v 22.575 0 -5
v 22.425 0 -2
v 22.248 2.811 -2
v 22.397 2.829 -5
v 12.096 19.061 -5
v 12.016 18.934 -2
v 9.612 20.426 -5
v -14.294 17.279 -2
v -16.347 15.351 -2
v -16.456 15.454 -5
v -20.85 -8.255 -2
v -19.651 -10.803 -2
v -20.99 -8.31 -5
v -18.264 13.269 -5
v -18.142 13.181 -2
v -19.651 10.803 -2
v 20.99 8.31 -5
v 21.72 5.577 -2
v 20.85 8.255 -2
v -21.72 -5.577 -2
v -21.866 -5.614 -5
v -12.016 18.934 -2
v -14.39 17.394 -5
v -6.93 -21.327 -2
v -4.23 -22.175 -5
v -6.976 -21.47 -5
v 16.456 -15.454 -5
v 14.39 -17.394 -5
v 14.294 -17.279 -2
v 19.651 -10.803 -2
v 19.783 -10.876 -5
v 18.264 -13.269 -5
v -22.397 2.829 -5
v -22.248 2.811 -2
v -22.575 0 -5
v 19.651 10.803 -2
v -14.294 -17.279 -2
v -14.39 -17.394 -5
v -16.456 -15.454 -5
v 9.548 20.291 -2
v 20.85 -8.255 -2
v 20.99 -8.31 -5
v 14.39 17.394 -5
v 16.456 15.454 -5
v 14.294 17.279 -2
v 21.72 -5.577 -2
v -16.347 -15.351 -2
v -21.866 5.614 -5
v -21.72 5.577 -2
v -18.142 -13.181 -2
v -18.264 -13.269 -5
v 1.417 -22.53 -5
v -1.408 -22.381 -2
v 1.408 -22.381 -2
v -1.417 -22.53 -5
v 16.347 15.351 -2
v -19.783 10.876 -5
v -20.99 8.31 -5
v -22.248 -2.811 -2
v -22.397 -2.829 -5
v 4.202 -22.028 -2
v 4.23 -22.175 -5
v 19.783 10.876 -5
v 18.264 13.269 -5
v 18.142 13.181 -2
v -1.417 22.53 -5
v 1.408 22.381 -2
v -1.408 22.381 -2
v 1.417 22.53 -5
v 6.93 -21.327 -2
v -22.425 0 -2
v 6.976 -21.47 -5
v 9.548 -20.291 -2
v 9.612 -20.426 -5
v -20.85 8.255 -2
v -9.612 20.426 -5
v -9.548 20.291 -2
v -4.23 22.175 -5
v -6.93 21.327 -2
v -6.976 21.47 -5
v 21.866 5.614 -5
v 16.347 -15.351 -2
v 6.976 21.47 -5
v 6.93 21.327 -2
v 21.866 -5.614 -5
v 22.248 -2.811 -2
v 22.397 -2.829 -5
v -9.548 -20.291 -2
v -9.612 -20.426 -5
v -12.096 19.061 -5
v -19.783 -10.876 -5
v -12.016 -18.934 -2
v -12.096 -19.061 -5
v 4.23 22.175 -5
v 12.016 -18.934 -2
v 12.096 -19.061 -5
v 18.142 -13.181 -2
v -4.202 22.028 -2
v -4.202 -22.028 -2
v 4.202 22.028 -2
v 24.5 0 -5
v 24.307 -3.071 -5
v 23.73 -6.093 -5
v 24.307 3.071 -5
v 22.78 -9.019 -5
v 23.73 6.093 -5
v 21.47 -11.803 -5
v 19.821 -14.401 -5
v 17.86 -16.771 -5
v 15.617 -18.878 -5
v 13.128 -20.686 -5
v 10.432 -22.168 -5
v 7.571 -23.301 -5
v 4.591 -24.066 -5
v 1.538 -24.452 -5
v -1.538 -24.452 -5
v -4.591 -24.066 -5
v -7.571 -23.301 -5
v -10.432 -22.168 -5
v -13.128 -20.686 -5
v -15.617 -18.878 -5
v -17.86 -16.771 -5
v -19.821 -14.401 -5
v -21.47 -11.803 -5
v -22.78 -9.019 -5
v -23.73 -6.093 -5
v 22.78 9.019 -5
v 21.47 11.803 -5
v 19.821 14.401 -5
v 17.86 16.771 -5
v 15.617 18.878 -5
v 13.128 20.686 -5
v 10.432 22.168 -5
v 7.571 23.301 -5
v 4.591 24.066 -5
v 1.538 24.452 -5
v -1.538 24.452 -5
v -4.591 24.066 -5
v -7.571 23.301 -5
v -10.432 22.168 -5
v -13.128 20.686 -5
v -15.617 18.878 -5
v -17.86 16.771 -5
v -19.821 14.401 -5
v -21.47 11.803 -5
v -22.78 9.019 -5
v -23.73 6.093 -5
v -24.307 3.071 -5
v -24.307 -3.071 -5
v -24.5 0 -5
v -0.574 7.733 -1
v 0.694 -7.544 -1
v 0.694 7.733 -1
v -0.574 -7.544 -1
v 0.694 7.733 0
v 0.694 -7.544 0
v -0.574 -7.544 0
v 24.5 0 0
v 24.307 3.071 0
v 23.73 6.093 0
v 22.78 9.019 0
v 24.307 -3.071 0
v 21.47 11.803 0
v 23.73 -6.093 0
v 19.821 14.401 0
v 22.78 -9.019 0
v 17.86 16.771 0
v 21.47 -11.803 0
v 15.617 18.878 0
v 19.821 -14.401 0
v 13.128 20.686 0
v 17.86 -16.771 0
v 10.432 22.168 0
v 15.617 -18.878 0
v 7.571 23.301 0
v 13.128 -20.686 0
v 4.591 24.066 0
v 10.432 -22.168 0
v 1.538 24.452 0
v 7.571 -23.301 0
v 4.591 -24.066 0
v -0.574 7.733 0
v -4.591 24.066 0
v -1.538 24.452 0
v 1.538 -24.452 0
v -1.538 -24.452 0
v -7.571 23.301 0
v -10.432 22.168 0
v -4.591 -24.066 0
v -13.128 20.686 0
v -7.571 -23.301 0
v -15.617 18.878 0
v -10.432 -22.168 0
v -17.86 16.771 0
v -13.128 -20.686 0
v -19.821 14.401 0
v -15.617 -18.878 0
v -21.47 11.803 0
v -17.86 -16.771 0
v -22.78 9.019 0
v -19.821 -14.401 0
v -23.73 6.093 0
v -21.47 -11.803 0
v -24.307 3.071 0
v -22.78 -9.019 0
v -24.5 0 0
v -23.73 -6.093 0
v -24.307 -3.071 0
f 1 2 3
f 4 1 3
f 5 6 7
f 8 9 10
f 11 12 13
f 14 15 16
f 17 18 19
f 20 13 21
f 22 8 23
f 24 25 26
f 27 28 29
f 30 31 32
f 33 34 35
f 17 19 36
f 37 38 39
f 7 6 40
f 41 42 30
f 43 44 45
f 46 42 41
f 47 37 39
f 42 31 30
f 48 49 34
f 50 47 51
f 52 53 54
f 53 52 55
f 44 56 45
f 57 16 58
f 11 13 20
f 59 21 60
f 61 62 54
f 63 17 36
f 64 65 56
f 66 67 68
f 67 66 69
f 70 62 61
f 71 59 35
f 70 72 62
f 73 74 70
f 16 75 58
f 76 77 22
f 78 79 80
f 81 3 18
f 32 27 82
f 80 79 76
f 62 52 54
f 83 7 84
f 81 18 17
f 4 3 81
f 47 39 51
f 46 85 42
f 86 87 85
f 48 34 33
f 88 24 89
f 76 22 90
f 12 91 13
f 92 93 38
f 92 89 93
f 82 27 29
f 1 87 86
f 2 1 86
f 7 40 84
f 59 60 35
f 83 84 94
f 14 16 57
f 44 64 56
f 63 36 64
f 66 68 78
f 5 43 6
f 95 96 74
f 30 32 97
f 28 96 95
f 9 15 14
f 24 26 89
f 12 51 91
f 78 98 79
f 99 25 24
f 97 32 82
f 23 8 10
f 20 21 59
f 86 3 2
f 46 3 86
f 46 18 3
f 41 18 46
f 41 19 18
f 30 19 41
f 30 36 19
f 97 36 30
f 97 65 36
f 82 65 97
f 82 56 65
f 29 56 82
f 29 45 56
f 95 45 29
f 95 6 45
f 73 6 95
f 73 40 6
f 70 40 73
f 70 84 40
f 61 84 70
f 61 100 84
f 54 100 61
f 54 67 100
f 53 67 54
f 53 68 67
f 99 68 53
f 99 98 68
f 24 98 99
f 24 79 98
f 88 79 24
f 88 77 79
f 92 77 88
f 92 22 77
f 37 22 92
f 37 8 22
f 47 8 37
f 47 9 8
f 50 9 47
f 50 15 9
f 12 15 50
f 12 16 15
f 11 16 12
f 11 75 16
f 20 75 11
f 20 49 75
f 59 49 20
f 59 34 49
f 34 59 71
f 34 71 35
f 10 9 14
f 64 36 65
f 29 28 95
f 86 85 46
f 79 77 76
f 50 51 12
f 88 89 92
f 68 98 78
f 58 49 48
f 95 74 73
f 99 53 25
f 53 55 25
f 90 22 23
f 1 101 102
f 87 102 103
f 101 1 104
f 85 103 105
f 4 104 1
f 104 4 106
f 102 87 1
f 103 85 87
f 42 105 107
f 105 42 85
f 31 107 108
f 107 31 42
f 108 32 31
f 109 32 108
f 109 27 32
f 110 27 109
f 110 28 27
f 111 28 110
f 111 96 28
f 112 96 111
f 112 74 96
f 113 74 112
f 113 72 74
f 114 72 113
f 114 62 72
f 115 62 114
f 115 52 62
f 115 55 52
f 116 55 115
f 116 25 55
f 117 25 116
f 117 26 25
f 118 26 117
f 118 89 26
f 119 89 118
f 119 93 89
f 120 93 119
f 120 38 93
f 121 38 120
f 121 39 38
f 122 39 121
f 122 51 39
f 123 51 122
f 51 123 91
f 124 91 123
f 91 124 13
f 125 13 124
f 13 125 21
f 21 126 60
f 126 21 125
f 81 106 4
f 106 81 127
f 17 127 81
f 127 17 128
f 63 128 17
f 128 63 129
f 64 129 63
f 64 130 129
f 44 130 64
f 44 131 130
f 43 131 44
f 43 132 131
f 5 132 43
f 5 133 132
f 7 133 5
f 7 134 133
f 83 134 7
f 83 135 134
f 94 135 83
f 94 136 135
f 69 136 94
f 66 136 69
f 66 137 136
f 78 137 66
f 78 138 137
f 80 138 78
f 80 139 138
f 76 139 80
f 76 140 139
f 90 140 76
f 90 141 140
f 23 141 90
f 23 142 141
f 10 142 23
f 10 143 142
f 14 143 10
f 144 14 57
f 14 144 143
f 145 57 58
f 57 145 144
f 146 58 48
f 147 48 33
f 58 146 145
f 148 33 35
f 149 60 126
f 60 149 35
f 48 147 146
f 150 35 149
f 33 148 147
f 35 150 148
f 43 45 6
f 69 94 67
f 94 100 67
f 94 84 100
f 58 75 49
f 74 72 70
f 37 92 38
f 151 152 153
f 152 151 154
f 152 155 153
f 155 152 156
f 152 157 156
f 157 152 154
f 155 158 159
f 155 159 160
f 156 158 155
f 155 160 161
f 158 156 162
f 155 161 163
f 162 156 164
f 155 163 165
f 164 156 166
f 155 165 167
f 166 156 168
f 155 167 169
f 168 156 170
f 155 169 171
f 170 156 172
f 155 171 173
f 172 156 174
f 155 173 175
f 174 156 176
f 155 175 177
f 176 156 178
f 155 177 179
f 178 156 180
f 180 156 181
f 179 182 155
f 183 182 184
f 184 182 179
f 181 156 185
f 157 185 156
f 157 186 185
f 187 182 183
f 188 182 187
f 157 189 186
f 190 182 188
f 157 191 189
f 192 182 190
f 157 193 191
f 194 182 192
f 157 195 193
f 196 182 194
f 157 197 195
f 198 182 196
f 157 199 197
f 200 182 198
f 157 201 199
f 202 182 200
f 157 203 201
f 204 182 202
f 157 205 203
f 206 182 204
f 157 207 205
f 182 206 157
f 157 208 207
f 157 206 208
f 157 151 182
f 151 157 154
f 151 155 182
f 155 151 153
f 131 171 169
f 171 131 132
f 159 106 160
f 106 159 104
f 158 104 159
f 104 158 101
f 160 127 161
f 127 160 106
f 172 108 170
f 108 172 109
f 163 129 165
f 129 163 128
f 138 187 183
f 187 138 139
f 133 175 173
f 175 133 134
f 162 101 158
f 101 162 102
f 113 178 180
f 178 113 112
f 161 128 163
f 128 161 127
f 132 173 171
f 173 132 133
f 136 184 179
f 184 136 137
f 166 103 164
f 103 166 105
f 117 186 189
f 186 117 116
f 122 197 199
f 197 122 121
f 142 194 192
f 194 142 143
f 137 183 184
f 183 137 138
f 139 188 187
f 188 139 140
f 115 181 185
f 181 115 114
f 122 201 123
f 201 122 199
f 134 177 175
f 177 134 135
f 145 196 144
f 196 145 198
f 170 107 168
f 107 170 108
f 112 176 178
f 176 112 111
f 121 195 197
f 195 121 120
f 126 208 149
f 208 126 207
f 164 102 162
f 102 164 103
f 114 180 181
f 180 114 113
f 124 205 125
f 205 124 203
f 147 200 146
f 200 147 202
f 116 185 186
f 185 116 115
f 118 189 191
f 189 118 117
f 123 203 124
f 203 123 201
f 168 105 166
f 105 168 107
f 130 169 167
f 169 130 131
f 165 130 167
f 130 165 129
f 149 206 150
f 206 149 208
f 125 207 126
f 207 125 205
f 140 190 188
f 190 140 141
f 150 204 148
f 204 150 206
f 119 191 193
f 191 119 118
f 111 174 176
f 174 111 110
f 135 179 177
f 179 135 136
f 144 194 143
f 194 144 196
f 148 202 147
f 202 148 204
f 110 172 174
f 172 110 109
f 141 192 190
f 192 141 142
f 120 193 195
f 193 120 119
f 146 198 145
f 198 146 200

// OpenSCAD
$fn = 50;


difference() {
	union() {
		translate(v = [0, 0, -5.0000000000]) {
			cylinder(h = 5, r = 24.5000000000);
		}
	}
	union() {
		#translate(v = [0, 0, -5.0000000000]) {
			cylinder(h = 3, r1 = 22.5750000000, r2 = 22.4250000000);
		}
		translate(v = [0, 0, -1]) {
			linear_extrude(height = 1) {
				text(font = "Wingdings", halign = "center", size = 11, text = "|", valign = "center");
			}
		}
	}
}
